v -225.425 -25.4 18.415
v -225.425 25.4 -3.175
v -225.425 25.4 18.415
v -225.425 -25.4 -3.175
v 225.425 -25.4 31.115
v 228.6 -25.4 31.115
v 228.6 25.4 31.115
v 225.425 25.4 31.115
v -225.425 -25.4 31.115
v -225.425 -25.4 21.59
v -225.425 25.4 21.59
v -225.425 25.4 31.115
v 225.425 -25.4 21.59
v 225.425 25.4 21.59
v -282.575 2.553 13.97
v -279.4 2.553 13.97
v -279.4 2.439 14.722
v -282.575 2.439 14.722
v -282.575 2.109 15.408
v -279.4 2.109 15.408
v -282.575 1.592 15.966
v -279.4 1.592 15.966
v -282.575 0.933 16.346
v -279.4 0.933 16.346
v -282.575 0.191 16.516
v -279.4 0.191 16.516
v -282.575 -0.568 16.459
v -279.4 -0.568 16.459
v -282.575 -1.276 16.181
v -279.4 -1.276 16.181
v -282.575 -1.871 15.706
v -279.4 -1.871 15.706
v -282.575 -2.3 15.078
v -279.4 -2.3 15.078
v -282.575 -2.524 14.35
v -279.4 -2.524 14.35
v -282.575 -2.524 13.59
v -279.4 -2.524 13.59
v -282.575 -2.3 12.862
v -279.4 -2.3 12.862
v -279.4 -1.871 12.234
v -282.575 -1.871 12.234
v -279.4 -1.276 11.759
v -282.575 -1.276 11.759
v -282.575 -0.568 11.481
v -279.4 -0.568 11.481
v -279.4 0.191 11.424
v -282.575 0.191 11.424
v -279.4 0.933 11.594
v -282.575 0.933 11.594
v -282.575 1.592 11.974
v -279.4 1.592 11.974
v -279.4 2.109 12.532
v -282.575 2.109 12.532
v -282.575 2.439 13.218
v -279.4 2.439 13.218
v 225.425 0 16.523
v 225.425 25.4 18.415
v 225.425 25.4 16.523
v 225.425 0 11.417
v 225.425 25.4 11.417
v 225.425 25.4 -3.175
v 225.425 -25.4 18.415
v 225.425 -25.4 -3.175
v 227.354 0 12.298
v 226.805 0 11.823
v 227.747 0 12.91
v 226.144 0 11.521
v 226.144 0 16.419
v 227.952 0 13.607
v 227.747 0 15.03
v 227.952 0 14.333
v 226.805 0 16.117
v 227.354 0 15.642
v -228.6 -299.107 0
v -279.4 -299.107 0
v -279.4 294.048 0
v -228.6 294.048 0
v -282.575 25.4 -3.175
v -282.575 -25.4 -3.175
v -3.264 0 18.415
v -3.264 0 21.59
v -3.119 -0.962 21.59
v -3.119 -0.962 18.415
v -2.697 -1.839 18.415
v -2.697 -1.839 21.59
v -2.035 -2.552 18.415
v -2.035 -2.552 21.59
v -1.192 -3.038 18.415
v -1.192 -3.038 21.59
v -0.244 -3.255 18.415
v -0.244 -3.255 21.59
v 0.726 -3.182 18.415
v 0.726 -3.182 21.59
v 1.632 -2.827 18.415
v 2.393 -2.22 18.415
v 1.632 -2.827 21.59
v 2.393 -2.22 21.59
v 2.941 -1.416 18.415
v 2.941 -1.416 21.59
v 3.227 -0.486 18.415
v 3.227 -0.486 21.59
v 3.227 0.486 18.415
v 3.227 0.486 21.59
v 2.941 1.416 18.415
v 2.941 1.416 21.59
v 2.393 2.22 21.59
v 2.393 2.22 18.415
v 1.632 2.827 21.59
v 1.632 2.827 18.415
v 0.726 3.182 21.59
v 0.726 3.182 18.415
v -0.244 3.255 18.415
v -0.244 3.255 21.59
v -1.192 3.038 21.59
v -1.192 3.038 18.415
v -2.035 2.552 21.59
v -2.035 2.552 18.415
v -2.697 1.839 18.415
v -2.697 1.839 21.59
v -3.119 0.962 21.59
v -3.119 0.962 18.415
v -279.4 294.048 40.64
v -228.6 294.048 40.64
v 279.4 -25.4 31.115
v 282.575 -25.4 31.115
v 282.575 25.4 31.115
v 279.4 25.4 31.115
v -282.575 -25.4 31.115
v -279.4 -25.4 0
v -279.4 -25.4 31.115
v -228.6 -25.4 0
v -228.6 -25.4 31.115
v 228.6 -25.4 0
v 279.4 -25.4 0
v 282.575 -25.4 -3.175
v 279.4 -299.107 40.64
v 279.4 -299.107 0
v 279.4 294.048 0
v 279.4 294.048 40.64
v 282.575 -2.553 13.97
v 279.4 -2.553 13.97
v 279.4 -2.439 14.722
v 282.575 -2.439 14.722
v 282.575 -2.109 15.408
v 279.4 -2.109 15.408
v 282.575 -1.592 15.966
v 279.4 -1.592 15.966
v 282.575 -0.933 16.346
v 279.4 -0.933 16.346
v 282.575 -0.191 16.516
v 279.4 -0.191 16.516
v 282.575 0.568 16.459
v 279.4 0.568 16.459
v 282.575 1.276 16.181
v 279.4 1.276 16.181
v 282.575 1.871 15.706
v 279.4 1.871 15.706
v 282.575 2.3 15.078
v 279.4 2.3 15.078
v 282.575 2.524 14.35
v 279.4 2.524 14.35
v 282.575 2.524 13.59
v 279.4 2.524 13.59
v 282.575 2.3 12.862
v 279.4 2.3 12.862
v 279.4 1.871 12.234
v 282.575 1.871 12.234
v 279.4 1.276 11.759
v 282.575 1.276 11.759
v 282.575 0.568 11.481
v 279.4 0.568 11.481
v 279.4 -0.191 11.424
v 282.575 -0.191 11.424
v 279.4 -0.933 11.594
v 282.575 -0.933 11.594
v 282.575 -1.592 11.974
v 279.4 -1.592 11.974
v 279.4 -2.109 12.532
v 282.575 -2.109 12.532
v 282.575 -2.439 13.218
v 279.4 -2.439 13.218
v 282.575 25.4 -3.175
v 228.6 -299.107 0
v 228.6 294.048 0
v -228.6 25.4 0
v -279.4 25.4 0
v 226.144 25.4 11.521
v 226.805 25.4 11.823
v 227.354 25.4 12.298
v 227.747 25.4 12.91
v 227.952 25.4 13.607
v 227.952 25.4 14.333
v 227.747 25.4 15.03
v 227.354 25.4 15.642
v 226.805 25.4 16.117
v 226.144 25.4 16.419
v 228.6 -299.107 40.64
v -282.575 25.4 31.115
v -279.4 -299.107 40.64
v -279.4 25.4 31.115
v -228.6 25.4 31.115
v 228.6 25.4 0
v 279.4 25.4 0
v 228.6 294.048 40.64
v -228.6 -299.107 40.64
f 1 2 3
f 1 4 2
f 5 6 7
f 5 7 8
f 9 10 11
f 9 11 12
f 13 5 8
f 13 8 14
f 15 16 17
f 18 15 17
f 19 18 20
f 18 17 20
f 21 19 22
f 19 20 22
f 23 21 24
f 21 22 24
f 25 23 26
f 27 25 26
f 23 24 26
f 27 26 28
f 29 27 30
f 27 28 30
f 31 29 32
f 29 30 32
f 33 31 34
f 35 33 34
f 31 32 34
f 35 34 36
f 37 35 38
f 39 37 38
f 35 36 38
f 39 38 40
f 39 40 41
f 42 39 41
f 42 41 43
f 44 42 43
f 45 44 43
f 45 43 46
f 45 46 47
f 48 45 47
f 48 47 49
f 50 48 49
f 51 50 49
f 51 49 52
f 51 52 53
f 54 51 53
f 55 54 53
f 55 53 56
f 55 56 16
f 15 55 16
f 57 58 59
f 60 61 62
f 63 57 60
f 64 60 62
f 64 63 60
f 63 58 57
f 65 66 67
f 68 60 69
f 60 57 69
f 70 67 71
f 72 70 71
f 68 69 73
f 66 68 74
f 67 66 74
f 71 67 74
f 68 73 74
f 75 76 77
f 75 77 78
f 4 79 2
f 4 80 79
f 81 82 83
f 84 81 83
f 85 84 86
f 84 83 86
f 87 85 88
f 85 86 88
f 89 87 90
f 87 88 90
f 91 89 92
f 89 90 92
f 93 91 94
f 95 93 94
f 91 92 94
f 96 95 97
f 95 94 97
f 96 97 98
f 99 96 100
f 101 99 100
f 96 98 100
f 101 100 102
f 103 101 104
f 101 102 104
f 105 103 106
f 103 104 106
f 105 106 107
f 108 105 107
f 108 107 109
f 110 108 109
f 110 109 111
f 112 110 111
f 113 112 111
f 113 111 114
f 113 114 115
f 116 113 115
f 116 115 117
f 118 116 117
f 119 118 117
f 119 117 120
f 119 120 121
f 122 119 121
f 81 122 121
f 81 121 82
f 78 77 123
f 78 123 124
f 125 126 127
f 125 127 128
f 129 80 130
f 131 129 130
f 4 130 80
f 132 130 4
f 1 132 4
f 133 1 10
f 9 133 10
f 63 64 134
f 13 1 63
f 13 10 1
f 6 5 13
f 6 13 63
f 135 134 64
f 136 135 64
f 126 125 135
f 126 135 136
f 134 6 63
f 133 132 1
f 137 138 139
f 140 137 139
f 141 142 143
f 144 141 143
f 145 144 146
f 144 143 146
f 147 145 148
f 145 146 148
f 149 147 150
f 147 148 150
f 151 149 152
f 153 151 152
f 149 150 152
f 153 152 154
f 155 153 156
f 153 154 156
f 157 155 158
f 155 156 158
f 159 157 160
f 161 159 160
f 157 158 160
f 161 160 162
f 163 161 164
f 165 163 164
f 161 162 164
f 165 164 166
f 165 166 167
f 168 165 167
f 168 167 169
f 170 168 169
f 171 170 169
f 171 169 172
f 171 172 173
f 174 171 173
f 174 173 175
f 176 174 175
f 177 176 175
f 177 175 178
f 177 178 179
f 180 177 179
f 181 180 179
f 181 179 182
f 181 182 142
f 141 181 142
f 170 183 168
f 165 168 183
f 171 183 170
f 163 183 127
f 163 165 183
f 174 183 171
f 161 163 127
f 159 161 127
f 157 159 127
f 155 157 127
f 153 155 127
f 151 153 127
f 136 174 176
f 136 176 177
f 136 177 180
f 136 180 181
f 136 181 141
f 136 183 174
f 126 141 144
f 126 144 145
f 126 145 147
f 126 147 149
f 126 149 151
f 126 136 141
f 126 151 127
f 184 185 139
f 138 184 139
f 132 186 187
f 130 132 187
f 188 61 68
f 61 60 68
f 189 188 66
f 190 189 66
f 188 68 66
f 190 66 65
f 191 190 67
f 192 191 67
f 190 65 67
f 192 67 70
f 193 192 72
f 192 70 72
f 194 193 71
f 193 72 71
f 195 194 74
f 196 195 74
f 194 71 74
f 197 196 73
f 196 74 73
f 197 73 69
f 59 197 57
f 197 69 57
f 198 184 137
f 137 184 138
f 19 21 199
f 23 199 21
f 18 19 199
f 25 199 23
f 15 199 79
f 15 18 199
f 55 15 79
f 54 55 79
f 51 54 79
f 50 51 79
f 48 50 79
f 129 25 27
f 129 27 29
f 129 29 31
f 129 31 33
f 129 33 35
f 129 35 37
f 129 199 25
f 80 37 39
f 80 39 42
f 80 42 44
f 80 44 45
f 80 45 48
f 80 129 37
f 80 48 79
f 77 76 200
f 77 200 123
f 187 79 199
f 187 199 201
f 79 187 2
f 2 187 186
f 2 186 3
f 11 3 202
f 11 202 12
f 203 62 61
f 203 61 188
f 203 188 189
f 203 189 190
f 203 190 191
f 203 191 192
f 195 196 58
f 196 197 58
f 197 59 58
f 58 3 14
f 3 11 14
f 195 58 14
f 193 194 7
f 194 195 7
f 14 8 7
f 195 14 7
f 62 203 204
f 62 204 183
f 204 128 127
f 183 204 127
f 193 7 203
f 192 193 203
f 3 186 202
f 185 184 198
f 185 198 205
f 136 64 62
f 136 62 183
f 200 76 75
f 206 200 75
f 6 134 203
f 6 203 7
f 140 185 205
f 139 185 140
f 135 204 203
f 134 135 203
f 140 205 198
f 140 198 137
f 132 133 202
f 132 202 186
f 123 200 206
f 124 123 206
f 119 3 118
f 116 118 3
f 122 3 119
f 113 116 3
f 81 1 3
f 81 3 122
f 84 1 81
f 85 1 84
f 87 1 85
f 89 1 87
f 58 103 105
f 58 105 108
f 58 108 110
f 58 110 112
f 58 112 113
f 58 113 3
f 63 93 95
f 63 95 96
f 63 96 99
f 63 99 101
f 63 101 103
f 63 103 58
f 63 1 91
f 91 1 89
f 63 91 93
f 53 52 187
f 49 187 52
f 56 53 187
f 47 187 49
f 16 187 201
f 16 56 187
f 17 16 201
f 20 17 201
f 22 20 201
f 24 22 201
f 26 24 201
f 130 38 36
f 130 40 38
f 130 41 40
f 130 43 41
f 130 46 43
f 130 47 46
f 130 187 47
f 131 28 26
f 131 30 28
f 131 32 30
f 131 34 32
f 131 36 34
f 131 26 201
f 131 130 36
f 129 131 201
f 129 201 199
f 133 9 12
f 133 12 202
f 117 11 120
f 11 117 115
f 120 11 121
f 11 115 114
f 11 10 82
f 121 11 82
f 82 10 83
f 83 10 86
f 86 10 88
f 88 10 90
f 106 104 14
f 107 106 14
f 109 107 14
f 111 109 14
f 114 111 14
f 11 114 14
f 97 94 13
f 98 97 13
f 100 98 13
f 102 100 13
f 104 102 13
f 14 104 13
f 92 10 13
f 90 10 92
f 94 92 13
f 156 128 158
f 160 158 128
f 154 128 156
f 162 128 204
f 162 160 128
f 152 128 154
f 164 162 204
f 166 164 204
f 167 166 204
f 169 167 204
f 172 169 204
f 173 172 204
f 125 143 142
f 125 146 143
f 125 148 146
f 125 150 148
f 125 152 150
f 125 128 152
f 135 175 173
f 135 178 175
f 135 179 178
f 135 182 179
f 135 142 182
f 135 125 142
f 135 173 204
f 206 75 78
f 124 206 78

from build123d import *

# Parameters (mm, degrees)
F0_W           = 50.8
F0_H           = 593.1544098956
F1_DEPTH       = 40.64
F2_W           = 450.85
F2_H           = 3.175
F3_DEPTH       = 25.4
F5_D           = 6.5278
F5_DEPTH       = 48.6891948718
F5_TIP         = 1.9611489744
F7_D           = 5.1054
F7_DEPTH       = 48.2684666667
F7_TIP         = 1.5338169022
F9_D           = 5.1054
F9_DEPTH       = 48.26
F9_TIP         = 1.5338169022
F9_ON_F8_D     = 5.1054
F9_ON_F8_DEPTH = 48.26
F9_ON_F8_TIP   = 1.5338169022


with BuildPart() as f1:
    # F0 (on Top) → F1 (new body)
    with BuildSketch(Plane.XY):
        with Locations((-254, -2.5294870138)):
            Rectangle(F0_W, F0_H)
    extrude(amount=F1_DEPTH)


with BuildPart() as f1b:
    # F0 (on Top) → F1, piece 2 (new body)
    with BuildSketch(Plane.XY):
        with Locations((254, -2.5294870138)):
            Rectangle(F0_W, F0_H)
    extrude(amount=F1_DEPTH)


with BuildPart() as f3:
    # F2 (on Front) → F3 (new body, symmetric)
    with BuildSketch(Plane.XZ):
        with Locations((0, 20.0025)):
            Rectangle(F2_W, F2_H)
        Polygon((-228.6, 0), (-279.4, 0), (-279.4, 31.115), (-282.575, 31.115), (-282.575, -3.175), (-225.425, -3.175), (-225.425, 18.415), (-225.425, 21.59), (-225.425, 31.115), (-228.6, 31.115), align=None)
        Polygon((225.425, 31.115), (225.425, 21.59), (225.425, 18.415), (225.425, -3.175), (282.575, -3.175), (282.575, 31.115), (279.4, 31.115), (279.4, 0), (228.6, 0), (228.6, 31.115), align=None)
    extrude(amount=F3_DEPTH, both=True)

    # F5
    with Locations(Plane(origin=(0, 0, 18.415), x_dir=(1, 0, 0), z_dir=(0, 0, -1))):
        with Locations((0, 0)):
            Hole(F5_D / 2, depth=F5_DEPTH)
            with Locations((0, 0, -(F5_DEPTH + F5_TIP / 2))):  # 118° drill point
                Cone(0, F5_D / 2, F5_TIP, mode=Mode.SUBTRACT)

    # F7
    with Locations(Plane(origin=(-282.575, 0, 0), x_dir=(0, -1, 0), z_dir=(-1, 0, 0))):
        with Locations((0, 13.97)):
            Hole(F7_D / 2, depth=F7_DEPTH)
            with Locations((0, 0, -(F7_DEPTH + F7_TIP / 2))):  # 118° drill point
                Cone(0, F7_D / 2, F7_TIP, mode=Mode.SUBTRACT)

    # F9 (one way)
    with BuildSketch(Plane.XZ):
        with Locations((225.425, 13.97)):
            Circle(F9_D / 2)
    extrude(amount=-F9_DEPTH, mode=Mode.SUBTRACT)
    with Locations(Plane.XZ):
        with Locations((225.425, 13.97)):
            with Locations((0, 0, -(F9_DEPTH + F9_TIP / 2))):  # 118° drill point
                Cone(0, F9_D / 2, F9_TIP, mode=Mode.SUBTRACT)

    # F9 on F8
    with Locations(Plane.YZ.offset(282.575)):
        with Locations((0, 13.97)):
            Hole(F9_ON_F8_D / 2, depth=F9_ON_F8_DEPTH)
            with Locations((0, 0, -(F9_ON_F8_DEPTH + F9_ON_F8_TIP / 2))):  # 118° drill point
                Cone(0, F9_ON_F8_D / 2, F9_ON_F8_TIP, mode=Mode.SUBTRACT)


solid = Compound([f1.part, f1b.part, f3.part])
